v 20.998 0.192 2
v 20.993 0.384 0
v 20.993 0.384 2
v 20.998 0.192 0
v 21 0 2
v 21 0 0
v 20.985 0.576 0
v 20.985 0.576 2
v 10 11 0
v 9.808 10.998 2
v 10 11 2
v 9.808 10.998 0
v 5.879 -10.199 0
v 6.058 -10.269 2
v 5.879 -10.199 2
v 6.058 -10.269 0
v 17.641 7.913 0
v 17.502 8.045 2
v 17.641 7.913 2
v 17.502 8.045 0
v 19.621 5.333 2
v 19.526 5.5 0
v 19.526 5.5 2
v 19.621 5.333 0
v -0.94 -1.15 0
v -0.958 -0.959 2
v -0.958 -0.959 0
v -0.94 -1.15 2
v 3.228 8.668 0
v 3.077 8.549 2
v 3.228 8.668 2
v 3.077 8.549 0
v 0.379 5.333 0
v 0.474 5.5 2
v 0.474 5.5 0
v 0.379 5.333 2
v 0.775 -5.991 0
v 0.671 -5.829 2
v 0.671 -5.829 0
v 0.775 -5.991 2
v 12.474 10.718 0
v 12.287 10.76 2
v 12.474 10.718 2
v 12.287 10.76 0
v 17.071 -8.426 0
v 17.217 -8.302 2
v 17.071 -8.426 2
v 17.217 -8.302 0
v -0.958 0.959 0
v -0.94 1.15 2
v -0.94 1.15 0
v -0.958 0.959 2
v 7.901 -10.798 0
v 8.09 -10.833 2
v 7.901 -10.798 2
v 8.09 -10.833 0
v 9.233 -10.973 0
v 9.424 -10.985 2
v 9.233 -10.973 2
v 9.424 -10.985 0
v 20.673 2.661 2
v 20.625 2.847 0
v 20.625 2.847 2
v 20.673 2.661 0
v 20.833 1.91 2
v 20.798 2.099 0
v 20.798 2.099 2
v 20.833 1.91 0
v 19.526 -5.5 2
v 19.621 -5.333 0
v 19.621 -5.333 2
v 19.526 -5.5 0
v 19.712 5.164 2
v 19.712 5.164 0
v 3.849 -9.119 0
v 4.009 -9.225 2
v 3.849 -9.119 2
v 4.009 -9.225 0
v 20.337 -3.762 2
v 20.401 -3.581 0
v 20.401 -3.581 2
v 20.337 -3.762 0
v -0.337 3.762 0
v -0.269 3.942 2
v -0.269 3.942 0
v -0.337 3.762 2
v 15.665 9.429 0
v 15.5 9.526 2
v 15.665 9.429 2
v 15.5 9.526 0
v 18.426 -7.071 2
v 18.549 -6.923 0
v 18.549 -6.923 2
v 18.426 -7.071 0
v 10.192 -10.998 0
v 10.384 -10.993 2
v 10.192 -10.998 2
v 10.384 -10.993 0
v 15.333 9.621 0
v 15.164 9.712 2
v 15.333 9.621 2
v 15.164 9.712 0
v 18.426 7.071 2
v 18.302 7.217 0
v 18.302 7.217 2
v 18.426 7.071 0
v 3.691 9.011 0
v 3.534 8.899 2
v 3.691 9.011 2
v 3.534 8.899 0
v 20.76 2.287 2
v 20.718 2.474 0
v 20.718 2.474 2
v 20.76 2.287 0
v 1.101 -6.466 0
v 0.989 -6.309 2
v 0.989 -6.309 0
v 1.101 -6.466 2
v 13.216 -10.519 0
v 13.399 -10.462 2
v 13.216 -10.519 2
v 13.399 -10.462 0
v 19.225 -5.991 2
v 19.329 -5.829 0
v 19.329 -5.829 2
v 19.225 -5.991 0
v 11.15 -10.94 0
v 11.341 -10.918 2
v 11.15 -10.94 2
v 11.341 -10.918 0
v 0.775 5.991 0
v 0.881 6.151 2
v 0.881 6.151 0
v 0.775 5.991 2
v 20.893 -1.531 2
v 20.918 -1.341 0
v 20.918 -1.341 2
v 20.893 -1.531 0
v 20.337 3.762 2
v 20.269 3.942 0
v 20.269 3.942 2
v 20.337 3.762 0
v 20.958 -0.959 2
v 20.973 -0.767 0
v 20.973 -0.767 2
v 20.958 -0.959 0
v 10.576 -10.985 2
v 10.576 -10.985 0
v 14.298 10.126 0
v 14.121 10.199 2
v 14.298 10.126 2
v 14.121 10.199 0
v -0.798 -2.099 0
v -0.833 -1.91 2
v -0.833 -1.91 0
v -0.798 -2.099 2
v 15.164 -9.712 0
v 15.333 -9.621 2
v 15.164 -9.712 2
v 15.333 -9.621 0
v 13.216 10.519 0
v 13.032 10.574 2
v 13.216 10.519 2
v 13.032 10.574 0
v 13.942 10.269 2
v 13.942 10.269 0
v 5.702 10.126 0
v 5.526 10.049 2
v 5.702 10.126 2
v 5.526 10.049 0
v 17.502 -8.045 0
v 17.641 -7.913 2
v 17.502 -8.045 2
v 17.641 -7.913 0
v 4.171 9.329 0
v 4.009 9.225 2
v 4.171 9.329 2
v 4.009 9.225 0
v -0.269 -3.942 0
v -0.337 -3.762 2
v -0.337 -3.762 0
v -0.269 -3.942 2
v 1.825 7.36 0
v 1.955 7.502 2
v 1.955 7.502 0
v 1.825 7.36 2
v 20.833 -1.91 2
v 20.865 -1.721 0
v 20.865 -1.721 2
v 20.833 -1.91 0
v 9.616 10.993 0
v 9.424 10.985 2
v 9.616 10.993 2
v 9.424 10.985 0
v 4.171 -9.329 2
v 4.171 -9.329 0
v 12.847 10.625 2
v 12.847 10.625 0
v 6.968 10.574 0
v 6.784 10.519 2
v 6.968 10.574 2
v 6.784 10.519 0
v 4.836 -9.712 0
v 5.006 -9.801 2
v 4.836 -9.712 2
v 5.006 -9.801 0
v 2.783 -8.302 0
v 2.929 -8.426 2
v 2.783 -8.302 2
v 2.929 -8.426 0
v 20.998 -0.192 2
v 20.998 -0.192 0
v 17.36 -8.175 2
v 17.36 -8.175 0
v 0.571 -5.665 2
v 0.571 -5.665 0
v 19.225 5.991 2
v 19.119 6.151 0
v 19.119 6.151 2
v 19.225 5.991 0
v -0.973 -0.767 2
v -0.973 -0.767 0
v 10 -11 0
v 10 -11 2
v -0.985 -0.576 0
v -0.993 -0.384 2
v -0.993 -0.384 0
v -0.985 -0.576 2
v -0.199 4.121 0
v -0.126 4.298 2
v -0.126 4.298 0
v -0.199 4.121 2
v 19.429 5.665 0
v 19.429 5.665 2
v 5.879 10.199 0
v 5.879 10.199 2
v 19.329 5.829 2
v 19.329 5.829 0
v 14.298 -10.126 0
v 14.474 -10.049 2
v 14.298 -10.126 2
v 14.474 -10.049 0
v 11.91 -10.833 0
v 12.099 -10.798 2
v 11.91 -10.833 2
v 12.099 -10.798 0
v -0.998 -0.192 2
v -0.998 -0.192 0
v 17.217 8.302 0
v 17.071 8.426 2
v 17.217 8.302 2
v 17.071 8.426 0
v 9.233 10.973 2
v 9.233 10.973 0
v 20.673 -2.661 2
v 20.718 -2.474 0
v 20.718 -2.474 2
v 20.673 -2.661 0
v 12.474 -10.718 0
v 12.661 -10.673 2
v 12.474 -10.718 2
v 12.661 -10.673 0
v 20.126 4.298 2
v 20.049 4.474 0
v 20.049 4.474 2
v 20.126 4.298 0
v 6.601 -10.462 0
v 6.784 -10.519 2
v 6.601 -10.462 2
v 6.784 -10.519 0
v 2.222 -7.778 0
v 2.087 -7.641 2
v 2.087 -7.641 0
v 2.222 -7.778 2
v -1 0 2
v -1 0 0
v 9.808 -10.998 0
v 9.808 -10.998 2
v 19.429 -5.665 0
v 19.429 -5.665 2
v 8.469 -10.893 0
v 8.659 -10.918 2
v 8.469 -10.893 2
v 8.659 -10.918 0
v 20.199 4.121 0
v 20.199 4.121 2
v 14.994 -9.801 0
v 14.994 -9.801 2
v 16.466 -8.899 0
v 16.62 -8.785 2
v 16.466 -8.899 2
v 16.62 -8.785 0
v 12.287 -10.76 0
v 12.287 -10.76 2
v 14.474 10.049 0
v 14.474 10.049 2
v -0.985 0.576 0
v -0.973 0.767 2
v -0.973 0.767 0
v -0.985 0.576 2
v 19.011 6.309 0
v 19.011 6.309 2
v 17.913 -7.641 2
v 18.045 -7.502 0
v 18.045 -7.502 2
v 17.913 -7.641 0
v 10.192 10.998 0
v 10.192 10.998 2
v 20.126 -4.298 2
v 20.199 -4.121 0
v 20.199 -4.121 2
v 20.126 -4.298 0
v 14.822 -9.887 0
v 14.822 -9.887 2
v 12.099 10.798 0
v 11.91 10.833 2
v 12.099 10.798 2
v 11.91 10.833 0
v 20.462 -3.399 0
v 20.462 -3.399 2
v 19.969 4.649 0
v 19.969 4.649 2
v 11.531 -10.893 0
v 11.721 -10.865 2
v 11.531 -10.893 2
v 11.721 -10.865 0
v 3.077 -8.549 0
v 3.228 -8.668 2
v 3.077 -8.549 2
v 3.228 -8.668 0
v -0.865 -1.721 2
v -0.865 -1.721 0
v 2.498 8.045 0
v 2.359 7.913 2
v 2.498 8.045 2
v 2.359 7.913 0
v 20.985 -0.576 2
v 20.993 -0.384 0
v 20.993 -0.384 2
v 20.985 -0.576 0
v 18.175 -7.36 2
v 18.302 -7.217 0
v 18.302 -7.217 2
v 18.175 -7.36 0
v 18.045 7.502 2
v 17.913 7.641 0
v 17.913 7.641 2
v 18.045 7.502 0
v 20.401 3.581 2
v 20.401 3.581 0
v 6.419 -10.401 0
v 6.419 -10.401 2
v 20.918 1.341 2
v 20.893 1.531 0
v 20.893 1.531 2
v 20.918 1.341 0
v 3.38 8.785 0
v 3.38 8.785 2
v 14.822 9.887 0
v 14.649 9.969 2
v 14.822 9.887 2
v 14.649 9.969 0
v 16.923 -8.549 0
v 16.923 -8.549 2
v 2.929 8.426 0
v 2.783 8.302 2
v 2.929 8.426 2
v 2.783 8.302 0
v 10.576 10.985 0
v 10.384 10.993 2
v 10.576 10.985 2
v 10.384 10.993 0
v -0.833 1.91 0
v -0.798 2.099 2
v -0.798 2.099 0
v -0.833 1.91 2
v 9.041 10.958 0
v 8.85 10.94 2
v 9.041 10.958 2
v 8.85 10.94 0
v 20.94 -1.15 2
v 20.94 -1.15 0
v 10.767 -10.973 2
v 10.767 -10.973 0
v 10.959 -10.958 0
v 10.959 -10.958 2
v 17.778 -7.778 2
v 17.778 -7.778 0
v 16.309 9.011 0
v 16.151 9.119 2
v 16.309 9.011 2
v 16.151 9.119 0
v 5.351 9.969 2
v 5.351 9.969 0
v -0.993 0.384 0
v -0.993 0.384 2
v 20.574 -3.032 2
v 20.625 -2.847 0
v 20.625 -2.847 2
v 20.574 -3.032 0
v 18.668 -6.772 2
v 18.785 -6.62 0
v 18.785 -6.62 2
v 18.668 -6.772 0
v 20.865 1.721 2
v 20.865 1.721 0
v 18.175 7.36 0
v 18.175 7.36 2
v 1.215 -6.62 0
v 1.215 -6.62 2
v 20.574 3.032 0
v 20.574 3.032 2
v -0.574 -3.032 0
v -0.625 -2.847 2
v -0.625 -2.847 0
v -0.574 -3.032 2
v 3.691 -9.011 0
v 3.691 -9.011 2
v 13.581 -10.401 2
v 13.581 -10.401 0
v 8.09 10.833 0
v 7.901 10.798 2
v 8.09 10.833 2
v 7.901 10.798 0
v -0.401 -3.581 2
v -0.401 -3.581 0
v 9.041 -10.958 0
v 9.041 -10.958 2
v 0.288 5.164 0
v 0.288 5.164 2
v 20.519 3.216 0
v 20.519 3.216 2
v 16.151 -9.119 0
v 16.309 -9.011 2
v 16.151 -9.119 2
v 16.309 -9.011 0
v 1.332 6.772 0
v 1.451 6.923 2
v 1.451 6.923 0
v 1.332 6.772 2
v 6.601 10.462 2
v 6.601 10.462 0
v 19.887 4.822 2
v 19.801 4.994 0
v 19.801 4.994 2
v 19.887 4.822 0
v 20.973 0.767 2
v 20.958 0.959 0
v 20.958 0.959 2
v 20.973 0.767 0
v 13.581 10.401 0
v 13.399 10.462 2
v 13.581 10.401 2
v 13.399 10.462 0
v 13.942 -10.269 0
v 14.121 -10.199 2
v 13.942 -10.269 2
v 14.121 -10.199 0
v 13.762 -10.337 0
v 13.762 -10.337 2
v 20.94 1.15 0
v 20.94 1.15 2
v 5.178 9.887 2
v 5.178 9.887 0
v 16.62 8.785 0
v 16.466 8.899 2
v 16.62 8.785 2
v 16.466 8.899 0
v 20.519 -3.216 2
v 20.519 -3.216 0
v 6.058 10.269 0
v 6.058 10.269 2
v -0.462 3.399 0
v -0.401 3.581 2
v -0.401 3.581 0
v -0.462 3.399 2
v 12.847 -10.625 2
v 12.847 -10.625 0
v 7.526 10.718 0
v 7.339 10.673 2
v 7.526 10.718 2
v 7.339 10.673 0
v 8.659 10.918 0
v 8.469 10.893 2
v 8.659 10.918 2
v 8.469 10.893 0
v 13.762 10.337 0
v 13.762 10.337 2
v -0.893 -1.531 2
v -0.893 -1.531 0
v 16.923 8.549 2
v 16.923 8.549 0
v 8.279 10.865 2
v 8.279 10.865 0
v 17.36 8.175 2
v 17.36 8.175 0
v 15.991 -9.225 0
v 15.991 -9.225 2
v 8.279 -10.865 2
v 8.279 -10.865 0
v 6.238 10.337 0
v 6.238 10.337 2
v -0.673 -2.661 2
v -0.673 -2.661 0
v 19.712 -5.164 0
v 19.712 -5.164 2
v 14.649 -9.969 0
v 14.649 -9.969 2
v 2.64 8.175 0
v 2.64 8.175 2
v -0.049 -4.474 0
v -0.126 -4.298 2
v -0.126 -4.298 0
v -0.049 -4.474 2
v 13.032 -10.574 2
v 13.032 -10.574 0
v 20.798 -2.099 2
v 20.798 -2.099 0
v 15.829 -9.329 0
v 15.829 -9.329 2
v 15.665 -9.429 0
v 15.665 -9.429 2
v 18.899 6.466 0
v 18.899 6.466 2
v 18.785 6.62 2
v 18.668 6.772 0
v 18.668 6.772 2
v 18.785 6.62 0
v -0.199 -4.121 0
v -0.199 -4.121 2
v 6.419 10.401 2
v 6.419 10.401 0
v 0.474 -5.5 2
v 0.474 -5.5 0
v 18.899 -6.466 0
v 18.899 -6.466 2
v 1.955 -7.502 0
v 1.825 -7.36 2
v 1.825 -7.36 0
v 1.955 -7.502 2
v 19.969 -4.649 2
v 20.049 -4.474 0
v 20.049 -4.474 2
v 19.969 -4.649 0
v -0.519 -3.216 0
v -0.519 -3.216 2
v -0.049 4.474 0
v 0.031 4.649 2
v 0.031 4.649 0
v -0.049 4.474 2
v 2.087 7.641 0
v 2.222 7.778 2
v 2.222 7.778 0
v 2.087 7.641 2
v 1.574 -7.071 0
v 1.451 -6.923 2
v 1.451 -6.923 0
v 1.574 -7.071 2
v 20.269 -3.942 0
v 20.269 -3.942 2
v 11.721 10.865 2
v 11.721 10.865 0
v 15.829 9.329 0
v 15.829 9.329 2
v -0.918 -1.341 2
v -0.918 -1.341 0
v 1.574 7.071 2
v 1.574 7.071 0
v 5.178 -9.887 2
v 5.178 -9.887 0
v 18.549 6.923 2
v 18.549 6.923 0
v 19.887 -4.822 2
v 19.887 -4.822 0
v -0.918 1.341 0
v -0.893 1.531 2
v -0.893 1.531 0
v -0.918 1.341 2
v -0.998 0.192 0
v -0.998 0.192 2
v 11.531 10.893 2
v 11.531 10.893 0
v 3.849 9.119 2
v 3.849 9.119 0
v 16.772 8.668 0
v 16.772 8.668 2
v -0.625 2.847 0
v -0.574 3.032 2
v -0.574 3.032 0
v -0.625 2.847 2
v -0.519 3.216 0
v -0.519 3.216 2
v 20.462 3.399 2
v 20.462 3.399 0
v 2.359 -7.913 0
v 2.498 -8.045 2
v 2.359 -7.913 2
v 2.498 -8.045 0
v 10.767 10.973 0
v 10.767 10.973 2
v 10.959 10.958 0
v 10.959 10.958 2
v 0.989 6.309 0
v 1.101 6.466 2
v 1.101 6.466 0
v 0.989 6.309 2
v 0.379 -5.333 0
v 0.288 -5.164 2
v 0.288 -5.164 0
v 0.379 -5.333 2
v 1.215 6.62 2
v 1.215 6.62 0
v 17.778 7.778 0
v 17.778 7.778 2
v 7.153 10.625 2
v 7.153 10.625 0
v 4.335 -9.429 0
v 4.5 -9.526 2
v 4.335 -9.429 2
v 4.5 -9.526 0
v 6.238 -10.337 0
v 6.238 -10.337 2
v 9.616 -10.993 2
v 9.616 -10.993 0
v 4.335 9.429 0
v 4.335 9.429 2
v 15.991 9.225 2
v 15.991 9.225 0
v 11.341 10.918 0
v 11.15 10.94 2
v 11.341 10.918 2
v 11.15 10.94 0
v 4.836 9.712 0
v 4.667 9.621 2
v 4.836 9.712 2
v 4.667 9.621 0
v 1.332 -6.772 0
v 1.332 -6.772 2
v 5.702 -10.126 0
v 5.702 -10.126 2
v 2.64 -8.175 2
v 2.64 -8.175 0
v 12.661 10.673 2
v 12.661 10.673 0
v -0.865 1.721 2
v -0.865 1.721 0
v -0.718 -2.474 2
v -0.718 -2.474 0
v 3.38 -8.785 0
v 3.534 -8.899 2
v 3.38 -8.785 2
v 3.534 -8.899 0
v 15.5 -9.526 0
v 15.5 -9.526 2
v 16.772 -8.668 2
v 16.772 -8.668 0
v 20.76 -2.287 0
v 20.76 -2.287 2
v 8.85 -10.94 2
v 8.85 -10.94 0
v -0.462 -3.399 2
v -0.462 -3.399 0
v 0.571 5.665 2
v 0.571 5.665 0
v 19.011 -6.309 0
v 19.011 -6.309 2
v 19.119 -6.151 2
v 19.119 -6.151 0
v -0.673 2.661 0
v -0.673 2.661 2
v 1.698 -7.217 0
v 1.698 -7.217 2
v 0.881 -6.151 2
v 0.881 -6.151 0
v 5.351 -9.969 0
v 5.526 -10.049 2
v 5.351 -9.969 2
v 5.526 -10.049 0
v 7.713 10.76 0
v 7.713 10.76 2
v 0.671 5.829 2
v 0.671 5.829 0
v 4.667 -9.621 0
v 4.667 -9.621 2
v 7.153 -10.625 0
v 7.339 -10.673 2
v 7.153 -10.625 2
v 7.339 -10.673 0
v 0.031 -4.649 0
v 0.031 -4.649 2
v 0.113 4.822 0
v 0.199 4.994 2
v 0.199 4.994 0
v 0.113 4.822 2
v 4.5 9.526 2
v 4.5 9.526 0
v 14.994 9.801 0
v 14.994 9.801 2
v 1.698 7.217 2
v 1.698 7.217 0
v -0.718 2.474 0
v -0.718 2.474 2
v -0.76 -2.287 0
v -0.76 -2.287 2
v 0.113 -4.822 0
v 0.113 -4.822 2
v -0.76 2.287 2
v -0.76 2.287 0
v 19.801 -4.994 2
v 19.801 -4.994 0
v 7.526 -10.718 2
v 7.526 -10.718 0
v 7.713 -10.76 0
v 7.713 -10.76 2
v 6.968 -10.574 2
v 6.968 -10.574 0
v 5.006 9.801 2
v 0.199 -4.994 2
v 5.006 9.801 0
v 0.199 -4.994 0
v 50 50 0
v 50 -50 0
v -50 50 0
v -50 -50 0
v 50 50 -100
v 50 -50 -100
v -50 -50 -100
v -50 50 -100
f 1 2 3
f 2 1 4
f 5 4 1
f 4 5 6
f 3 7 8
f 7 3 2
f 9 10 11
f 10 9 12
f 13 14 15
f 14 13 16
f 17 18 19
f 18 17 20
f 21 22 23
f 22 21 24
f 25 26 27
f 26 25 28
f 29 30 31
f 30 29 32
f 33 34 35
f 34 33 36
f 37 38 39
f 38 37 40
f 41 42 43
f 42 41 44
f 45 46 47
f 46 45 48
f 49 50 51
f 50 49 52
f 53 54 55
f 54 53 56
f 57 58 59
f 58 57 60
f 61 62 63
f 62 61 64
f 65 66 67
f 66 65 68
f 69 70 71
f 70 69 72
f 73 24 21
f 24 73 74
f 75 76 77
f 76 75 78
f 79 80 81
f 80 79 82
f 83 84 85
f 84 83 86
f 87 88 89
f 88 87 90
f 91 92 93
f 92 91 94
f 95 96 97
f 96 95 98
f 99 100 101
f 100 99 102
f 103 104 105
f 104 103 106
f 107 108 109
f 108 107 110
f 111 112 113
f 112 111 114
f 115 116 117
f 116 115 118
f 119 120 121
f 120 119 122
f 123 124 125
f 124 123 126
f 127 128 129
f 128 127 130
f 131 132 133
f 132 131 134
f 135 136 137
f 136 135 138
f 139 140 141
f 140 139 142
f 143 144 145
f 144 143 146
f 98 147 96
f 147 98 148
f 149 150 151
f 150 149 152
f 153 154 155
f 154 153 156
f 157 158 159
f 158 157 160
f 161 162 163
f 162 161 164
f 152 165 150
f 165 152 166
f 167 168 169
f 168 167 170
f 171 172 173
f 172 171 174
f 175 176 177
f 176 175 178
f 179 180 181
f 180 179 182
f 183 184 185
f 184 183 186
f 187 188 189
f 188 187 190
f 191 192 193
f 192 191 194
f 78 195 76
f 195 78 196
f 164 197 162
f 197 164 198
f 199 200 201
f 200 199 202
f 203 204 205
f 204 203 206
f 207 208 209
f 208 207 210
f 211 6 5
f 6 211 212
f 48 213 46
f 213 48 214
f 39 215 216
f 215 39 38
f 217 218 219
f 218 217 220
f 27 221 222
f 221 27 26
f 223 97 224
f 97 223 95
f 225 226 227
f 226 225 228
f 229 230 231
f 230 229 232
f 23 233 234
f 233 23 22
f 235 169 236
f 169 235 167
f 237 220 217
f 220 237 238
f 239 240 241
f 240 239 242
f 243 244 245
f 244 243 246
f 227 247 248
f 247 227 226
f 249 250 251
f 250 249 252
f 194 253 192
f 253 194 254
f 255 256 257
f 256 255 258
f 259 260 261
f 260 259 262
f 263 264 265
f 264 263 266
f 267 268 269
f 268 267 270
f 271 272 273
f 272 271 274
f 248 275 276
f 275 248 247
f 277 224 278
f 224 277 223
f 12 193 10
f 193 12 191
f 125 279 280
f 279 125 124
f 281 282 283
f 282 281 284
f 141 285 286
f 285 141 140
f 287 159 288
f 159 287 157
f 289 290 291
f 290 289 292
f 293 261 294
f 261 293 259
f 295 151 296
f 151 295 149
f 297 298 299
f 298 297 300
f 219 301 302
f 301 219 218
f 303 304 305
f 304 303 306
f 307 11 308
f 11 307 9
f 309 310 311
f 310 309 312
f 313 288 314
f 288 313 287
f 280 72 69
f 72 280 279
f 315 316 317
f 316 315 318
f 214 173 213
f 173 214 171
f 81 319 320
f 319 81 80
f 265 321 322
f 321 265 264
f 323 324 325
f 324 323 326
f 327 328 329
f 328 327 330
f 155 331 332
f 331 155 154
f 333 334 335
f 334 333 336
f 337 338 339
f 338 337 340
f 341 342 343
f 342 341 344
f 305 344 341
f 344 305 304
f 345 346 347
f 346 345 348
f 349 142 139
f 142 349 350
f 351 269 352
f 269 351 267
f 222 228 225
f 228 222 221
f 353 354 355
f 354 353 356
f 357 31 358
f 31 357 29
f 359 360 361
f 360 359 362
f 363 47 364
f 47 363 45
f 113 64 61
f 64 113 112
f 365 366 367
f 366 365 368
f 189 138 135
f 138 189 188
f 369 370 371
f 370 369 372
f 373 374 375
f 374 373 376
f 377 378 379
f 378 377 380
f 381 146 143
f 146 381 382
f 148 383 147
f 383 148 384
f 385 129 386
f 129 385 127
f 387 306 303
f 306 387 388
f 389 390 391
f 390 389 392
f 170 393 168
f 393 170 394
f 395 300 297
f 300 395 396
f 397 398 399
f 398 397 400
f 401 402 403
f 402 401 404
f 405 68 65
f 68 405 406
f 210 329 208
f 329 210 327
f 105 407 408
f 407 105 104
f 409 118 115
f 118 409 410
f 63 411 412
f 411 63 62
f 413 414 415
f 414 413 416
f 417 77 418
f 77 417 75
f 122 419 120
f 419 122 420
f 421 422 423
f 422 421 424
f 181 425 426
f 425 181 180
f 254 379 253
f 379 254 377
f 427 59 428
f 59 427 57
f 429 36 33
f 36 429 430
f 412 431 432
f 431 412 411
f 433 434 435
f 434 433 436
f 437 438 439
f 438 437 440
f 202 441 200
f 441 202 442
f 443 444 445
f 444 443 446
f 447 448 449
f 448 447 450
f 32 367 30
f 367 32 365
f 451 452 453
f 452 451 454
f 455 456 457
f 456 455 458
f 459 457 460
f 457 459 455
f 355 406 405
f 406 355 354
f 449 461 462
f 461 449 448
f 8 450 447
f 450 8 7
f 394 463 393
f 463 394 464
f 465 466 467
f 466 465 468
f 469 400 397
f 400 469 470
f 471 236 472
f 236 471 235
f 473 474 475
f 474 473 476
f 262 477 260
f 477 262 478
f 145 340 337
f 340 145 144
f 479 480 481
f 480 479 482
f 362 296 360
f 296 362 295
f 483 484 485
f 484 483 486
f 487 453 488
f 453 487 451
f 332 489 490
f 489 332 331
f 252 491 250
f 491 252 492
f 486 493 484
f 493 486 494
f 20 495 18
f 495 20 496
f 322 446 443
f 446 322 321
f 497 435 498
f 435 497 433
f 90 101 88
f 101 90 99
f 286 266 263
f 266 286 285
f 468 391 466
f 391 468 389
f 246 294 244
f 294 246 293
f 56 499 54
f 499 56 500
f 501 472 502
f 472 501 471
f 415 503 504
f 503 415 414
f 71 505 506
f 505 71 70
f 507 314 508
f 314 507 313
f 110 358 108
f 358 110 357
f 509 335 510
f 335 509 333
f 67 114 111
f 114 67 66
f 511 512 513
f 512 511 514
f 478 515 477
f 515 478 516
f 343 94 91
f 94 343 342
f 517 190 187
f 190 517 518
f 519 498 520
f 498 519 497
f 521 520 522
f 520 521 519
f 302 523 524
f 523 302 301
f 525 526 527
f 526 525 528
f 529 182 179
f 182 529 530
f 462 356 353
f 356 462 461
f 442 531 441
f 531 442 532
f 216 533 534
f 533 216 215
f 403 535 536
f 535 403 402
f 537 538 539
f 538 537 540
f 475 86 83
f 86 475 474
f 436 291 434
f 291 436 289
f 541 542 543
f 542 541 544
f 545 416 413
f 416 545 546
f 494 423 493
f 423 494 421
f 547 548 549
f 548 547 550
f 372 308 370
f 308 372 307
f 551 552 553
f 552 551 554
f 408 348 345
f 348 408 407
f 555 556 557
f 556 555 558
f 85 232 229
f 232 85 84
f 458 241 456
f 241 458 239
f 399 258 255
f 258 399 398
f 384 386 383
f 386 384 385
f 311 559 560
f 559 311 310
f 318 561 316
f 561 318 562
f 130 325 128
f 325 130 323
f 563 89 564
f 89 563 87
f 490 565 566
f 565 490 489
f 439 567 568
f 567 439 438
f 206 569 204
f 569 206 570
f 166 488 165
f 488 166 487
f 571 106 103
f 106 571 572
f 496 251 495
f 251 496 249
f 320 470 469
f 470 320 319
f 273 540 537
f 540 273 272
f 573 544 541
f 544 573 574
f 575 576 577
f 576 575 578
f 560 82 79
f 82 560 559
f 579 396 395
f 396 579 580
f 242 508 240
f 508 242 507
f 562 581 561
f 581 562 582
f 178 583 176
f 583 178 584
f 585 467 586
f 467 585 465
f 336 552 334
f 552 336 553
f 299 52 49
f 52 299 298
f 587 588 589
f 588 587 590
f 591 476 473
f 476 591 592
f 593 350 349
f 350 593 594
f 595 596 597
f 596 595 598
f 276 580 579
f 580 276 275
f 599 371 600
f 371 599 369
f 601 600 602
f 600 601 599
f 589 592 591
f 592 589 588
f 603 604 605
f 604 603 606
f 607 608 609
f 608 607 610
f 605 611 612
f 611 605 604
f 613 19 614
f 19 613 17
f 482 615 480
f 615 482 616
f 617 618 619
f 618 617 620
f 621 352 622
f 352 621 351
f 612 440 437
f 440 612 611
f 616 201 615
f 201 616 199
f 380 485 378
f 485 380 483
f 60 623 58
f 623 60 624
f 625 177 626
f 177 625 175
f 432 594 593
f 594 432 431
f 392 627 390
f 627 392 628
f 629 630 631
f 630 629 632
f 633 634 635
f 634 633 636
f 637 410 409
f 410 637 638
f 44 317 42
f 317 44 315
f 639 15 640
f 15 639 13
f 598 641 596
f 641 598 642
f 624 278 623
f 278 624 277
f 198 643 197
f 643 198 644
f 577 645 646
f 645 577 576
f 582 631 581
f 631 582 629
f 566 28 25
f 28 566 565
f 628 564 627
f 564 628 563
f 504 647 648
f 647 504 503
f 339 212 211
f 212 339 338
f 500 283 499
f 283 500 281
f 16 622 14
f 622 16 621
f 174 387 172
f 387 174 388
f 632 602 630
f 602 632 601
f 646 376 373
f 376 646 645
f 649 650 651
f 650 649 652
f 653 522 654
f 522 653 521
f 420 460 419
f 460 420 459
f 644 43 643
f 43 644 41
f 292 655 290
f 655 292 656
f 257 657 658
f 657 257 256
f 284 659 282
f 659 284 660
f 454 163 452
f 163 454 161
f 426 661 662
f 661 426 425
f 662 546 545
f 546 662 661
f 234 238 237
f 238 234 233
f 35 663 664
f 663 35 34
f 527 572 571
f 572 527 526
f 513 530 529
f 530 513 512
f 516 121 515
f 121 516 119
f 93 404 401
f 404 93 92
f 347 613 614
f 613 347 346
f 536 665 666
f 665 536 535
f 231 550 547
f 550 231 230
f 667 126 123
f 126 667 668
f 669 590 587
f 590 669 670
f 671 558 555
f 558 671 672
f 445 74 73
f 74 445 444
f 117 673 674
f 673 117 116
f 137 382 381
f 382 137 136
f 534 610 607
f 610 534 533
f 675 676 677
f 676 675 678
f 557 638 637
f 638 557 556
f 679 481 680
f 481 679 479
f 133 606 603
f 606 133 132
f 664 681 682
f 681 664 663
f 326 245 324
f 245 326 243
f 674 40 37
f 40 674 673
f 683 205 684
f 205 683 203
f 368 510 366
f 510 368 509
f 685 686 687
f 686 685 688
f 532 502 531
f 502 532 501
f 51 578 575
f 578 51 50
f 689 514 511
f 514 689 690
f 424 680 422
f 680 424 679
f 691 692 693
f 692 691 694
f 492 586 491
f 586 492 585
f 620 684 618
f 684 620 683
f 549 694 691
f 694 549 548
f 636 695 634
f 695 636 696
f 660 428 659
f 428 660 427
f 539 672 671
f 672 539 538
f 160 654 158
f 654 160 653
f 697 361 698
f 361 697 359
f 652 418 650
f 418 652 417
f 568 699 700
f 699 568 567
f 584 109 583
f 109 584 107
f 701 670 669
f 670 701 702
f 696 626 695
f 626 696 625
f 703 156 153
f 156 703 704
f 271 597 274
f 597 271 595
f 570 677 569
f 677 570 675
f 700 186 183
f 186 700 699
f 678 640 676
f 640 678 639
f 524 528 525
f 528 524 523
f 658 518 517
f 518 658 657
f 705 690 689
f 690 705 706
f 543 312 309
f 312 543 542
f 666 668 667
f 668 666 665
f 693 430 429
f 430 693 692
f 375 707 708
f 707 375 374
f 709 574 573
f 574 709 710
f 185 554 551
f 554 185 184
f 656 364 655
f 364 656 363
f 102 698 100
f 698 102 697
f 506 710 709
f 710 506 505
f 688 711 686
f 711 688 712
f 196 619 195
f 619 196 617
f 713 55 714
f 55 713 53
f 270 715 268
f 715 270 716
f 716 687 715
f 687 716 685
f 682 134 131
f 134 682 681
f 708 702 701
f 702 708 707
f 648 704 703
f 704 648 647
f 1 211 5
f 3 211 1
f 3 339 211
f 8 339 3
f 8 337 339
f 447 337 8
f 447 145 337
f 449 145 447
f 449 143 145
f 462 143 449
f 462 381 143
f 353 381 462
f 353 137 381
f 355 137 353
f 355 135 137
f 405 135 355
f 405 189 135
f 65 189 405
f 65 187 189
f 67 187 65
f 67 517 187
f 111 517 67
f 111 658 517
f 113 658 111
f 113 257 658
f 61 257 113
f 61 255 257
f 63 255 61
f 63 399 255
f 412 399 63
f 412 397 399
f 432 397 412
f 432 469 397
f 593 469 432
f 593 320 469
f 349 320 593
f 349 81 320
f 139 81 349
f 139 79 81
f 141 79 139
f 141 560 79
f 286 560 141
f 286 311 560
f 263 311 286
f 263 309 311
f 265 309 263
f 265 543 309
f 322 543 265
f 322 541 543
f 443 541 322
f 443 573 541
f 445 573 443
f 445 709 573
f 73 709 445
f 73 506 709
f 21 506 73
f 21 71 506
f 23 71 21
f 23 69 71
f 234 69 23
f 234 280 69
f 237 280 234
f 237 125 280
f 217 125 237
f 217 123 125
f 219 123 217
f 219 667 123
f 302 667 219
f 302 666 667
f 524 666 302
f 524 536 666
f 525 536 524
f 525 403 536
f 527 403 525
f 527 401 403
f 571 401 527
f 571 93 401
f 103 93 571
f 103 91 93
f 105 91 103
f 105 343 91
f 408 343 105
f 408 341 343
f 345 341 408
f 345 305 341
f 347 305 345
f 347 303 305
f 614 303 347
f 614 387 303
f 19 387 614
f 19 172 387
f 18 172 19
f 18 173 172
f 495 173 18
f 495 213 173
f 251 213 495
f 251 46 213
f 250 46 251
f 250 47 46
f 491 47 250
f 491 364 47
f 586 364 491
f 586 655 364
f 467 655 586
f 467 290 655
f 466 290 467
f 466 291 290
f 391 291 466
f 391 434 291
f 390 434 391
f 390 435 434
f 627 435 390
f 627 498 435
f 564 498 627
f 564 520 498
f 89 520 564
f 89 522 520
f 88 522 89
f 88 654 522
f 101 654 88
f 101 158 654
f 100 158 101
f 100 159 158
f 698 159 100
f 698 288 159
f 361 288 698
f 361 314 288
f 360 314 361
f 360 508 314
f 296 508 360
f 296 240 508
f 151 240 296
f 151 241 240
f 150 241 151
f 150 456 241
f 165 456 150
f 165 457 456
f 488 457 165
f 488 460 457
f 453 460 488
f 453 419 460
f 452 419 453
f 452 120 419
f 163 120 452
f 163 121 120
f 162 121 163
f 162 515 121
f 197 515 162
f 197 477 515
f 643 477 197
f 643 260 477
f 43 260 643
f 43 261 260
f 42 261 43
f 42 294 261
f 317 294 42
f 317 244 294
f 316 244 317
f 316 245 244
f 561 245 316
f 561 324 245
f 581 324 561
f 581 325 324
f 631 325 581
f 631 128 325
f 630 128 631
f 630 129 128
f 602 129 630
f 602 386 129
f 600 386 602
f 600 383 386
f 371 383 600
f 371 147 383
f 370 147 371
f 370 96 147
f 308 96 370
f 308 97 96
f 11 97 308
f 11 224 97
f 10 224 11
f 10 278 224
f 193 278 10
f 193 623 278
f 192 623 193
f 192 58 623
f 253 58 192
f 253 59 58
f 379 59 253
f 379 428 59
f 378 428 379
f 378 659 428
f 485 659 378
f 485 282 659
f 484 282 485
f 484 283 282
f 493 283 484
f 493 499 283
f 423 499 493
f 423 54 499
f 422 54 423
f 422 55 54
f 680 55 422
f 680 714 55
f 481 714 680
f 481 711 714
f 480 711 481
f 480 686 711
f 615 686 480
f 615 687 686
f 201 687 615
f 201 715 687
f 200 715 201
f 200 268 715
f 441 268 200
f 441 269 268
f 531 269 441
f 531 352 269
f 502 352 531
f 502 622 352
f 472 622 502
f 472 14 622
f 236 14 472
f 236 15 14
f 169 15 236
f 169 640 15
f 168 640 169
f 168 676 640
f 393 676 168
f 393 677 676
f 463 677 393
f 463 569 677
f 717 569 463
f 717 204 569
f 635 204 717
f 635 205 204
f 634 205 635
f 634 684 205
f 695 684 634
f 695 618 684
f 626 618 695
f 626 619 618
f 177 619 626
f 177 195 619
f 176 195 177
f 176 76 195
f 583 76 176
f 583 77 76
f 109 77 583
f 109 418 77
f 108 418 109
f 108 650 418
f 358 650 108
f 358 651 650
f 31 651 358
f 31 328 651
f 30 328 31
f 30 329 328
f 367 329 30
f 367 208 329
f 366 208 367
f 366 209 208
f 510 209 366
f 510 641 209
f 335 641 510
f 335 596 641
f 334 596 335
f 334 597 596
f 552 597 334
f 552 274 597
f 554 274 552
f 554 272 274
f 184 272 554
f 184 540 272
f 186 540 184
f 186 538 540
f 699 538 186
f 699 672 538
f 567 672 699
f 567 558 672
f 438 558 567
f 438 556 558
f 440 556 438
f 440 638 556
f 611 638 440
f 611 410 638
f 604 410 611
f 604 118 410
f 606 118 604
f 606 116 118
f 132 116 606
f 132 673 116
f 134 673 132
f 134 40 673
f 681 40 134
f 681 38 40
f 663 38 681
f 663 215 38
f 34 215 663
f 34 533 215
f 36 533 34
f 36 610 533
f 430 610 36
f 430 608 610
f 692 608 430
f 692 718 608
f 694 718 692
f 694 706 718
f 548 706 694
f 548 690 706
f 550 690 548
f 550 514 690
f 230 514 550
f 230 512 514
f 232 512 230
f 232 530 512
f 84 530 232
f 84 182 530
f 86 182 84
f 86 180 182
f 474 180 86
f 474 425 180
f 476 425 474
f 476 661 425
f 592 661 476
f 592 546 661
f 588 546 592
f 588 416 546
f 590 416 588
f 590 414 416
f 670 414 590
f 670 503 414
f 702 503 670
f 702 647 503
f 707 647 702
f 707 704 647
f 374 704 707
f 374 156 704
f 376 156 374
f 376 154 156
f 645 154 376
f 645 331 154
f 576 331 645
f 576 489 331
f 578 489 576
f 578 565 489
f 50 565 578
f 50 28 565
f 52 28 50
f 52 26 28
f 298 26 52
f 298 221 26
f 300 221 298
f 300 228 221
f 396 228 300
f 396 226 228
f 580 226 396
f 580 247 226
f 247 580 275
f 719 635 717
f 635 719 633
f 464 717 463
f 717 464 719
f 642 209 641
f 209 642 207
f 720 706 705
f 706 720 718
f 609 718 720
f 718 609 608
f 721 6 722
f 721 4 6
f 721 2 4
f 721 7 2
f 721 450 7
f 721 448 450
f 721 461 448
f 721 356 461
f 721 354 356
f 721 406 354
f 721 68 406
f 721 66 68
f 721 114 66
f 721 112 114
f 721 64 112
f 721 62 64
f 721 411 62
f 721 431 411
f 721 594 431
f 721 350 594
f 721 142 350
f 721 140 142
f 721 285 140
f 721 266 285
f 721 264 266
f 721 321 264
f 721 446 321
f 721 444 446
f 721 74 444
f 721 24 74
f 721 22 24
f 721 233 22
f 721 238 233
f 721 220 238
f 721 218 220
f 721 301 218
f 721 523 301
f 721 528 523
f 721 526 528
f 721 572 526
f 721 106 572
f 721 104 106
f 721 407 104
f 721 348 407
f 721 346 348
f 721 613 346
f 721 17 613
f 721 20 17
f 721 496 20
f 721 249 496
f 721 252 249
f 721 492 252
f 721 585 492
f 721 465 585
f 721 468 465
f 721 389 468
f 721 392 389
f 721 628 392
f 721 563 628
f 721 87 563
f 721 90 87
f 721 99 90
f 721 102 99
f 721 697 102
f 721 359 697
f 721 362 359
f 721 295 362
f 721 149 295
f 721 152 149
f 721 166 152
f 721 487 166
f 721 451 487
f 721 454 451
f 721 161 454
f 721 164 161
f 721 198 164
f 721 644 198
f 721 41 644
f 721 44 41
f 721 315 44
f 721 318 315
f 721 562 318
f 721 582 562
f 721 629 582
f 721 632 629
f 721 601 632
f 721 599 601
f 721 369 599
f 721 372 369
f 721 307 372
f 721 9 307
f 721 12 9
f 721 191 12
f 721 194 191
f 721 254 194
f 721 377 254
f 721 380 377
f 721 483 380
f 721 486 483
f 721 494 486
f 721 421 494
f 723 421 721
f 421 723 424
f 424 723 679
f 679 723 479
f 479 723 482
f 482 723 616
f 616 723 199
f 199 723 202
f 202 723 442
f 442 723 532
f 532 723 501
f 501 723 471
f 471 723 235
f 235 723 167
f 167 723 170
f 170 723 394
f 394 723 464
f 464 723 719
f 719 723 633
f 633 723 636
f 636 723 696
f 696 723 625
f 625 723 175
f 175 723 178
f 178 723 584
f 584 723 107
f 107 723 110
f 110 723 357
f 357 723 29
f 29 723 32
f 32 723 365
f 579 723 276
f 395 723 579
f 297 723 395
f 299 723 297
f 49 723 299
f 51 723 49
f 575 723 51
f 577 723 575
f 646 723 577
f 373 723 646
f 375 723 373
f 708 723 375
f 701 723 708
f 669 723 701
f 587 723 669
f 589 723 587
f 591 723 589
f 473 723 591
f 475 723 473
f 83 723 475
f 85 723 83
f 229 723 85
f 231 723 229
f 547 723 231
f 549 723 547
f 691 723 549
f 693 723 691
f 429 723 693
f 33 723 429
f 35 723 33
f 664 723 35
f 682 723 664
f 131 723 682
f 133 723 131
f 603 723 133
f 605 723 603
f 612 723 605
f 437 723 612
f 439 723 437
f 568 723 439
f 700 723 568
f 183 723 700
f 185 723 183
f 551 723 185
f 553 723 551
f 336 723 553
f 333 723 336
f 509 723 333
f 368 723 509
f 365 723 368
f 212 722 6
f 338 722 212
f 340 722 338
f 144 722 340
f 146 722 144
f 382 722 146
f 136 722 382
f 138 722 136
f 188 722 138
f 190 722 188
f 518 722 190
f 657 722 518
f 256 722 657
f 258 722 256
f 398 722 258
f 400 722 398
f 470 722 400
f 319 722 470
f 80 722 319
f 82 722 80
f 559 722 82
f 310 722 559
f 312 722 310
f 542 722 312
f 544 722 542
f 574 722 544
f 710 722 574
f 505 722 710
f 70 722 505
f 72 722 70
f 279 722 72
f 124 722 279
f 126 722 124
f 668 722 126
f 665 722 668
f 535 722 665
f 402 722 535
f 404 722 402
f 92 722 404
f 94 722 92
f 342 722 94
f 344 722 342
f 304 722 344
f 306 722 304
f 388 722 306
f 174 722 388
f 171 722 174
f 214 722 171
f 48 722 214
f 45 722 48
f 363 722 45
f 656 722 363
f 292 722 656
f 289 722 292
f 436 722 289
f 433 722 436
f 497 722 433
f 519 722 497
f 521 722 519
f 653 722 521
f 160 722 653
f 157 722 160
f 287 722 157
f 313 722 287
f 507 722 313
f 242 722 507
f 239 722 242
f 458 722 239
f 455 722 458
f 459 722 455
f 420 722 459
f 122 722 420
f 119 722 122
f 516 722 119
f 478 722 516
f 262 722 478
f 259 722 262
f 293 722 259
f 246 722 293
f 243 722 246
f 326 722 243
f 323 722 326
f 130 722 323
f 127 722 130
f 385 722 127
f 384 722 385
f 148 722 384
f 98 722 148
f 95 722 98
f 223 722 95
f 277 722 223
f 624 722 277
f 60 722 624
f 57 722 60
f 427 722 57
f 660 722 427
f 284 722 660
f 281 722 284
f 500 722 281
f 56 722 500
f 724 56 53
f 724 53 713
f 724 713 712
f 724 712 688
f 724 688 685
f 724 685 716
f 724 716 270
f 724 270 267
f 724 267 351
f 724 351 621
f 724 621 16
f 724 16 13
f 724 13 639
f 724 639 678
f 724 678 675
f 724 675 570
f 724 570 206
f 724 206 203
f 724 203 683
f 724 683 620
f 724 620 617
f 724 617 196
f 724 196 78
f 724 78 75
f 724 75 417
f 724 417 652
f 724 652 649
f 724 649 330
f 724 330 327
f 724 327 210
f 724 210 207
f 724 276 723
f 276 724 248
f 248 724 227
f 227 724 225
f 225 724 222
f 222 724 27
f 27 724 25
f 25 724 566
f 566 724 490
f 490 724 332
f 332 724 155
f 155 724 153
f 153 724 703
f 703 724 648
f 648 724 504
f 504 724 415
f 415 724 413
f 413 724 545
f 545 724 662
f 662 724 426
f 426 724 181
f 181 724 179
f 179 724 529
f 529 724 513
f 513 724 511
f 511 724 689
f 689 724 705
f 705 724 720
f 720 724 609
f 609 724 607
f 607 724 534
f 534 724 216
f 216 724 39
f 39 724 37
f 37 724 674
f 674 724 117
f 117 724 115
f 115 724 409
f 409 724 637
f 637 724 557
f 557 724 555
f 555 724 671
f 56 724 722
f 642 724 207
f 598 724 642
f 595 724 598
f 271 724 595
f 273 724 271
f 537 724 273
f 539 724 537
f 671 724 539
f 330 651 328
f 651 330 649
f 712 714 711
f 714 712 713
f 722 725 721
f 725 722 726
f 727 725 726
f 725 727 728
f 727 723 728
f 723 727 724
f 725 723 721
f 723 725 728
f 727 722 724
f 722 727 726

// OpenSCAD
d1=22;
d2=10;
u=10;
v=0;
c1=[1,0,0];
c2=[1,0,1];
l_table=100;
l_mire=50;
l_coin=10;
mire=0;

if (mire==0){
    translate([u,v,0]){
        color(c1,1){
            difference(){
                cylinder(2,r=d1/2,$fn=360);
                translate([0,0,-1]) cylinder(4,r=d2/2,$fn=360);
            }
        };
        color(c2,1) cylinder(2,r=d2/2,$fn=360);
    }
}

color("blue") translate([-l_table/2,-l_table/2,-l_table]) cube(l_table);

if (mire==1){
    difference(){
        difference(){
            difference(){
                difference(){
                    color("white") translate([-l_mire/2-5,-l_mire/2-5,-l_mire-8]) cube(l_mire+10);
                    translate([-l_mire/2-l_coin/2,-l_mire/2-l_coin/2,-l_coin+3]) cube(l_coin);
                };
                translate([-l_mire/2-l_coin/2,l_mire/2-l_coin/2,-l_coin+3]) cube(l_coin);   
            };
            translate([l_mire/2-l_coin/2,-l_mire/2-l_coin/2,-l_coin+3]) cube(l_coin);
        };
        translate([l_mire/2-l_coin/2,l_mire/2-l_coin/2,-l_coin+3]) cube(l_coin);    
    }

    color("black") translate([-l_mire/2-l_coin/2,-l_mire/2-l_coin/2,-l_coin+2]) cube(l_coin);
    color("black") translate([-l_mire/2-l_coin/2,l_mire/2-l_coin/2,-l_coin+2]) cube(l_coin);
    color("black") translate([l_mire/2-l_coin/2,-l_mire/2-l_coin/2,-l_coin+2]) cube(l_coin);
    color("black") translate([l_mire/2-l_coin/2,l_mire/2-l_coin/2,-l_coin+2]) cube(l_coin);
}
